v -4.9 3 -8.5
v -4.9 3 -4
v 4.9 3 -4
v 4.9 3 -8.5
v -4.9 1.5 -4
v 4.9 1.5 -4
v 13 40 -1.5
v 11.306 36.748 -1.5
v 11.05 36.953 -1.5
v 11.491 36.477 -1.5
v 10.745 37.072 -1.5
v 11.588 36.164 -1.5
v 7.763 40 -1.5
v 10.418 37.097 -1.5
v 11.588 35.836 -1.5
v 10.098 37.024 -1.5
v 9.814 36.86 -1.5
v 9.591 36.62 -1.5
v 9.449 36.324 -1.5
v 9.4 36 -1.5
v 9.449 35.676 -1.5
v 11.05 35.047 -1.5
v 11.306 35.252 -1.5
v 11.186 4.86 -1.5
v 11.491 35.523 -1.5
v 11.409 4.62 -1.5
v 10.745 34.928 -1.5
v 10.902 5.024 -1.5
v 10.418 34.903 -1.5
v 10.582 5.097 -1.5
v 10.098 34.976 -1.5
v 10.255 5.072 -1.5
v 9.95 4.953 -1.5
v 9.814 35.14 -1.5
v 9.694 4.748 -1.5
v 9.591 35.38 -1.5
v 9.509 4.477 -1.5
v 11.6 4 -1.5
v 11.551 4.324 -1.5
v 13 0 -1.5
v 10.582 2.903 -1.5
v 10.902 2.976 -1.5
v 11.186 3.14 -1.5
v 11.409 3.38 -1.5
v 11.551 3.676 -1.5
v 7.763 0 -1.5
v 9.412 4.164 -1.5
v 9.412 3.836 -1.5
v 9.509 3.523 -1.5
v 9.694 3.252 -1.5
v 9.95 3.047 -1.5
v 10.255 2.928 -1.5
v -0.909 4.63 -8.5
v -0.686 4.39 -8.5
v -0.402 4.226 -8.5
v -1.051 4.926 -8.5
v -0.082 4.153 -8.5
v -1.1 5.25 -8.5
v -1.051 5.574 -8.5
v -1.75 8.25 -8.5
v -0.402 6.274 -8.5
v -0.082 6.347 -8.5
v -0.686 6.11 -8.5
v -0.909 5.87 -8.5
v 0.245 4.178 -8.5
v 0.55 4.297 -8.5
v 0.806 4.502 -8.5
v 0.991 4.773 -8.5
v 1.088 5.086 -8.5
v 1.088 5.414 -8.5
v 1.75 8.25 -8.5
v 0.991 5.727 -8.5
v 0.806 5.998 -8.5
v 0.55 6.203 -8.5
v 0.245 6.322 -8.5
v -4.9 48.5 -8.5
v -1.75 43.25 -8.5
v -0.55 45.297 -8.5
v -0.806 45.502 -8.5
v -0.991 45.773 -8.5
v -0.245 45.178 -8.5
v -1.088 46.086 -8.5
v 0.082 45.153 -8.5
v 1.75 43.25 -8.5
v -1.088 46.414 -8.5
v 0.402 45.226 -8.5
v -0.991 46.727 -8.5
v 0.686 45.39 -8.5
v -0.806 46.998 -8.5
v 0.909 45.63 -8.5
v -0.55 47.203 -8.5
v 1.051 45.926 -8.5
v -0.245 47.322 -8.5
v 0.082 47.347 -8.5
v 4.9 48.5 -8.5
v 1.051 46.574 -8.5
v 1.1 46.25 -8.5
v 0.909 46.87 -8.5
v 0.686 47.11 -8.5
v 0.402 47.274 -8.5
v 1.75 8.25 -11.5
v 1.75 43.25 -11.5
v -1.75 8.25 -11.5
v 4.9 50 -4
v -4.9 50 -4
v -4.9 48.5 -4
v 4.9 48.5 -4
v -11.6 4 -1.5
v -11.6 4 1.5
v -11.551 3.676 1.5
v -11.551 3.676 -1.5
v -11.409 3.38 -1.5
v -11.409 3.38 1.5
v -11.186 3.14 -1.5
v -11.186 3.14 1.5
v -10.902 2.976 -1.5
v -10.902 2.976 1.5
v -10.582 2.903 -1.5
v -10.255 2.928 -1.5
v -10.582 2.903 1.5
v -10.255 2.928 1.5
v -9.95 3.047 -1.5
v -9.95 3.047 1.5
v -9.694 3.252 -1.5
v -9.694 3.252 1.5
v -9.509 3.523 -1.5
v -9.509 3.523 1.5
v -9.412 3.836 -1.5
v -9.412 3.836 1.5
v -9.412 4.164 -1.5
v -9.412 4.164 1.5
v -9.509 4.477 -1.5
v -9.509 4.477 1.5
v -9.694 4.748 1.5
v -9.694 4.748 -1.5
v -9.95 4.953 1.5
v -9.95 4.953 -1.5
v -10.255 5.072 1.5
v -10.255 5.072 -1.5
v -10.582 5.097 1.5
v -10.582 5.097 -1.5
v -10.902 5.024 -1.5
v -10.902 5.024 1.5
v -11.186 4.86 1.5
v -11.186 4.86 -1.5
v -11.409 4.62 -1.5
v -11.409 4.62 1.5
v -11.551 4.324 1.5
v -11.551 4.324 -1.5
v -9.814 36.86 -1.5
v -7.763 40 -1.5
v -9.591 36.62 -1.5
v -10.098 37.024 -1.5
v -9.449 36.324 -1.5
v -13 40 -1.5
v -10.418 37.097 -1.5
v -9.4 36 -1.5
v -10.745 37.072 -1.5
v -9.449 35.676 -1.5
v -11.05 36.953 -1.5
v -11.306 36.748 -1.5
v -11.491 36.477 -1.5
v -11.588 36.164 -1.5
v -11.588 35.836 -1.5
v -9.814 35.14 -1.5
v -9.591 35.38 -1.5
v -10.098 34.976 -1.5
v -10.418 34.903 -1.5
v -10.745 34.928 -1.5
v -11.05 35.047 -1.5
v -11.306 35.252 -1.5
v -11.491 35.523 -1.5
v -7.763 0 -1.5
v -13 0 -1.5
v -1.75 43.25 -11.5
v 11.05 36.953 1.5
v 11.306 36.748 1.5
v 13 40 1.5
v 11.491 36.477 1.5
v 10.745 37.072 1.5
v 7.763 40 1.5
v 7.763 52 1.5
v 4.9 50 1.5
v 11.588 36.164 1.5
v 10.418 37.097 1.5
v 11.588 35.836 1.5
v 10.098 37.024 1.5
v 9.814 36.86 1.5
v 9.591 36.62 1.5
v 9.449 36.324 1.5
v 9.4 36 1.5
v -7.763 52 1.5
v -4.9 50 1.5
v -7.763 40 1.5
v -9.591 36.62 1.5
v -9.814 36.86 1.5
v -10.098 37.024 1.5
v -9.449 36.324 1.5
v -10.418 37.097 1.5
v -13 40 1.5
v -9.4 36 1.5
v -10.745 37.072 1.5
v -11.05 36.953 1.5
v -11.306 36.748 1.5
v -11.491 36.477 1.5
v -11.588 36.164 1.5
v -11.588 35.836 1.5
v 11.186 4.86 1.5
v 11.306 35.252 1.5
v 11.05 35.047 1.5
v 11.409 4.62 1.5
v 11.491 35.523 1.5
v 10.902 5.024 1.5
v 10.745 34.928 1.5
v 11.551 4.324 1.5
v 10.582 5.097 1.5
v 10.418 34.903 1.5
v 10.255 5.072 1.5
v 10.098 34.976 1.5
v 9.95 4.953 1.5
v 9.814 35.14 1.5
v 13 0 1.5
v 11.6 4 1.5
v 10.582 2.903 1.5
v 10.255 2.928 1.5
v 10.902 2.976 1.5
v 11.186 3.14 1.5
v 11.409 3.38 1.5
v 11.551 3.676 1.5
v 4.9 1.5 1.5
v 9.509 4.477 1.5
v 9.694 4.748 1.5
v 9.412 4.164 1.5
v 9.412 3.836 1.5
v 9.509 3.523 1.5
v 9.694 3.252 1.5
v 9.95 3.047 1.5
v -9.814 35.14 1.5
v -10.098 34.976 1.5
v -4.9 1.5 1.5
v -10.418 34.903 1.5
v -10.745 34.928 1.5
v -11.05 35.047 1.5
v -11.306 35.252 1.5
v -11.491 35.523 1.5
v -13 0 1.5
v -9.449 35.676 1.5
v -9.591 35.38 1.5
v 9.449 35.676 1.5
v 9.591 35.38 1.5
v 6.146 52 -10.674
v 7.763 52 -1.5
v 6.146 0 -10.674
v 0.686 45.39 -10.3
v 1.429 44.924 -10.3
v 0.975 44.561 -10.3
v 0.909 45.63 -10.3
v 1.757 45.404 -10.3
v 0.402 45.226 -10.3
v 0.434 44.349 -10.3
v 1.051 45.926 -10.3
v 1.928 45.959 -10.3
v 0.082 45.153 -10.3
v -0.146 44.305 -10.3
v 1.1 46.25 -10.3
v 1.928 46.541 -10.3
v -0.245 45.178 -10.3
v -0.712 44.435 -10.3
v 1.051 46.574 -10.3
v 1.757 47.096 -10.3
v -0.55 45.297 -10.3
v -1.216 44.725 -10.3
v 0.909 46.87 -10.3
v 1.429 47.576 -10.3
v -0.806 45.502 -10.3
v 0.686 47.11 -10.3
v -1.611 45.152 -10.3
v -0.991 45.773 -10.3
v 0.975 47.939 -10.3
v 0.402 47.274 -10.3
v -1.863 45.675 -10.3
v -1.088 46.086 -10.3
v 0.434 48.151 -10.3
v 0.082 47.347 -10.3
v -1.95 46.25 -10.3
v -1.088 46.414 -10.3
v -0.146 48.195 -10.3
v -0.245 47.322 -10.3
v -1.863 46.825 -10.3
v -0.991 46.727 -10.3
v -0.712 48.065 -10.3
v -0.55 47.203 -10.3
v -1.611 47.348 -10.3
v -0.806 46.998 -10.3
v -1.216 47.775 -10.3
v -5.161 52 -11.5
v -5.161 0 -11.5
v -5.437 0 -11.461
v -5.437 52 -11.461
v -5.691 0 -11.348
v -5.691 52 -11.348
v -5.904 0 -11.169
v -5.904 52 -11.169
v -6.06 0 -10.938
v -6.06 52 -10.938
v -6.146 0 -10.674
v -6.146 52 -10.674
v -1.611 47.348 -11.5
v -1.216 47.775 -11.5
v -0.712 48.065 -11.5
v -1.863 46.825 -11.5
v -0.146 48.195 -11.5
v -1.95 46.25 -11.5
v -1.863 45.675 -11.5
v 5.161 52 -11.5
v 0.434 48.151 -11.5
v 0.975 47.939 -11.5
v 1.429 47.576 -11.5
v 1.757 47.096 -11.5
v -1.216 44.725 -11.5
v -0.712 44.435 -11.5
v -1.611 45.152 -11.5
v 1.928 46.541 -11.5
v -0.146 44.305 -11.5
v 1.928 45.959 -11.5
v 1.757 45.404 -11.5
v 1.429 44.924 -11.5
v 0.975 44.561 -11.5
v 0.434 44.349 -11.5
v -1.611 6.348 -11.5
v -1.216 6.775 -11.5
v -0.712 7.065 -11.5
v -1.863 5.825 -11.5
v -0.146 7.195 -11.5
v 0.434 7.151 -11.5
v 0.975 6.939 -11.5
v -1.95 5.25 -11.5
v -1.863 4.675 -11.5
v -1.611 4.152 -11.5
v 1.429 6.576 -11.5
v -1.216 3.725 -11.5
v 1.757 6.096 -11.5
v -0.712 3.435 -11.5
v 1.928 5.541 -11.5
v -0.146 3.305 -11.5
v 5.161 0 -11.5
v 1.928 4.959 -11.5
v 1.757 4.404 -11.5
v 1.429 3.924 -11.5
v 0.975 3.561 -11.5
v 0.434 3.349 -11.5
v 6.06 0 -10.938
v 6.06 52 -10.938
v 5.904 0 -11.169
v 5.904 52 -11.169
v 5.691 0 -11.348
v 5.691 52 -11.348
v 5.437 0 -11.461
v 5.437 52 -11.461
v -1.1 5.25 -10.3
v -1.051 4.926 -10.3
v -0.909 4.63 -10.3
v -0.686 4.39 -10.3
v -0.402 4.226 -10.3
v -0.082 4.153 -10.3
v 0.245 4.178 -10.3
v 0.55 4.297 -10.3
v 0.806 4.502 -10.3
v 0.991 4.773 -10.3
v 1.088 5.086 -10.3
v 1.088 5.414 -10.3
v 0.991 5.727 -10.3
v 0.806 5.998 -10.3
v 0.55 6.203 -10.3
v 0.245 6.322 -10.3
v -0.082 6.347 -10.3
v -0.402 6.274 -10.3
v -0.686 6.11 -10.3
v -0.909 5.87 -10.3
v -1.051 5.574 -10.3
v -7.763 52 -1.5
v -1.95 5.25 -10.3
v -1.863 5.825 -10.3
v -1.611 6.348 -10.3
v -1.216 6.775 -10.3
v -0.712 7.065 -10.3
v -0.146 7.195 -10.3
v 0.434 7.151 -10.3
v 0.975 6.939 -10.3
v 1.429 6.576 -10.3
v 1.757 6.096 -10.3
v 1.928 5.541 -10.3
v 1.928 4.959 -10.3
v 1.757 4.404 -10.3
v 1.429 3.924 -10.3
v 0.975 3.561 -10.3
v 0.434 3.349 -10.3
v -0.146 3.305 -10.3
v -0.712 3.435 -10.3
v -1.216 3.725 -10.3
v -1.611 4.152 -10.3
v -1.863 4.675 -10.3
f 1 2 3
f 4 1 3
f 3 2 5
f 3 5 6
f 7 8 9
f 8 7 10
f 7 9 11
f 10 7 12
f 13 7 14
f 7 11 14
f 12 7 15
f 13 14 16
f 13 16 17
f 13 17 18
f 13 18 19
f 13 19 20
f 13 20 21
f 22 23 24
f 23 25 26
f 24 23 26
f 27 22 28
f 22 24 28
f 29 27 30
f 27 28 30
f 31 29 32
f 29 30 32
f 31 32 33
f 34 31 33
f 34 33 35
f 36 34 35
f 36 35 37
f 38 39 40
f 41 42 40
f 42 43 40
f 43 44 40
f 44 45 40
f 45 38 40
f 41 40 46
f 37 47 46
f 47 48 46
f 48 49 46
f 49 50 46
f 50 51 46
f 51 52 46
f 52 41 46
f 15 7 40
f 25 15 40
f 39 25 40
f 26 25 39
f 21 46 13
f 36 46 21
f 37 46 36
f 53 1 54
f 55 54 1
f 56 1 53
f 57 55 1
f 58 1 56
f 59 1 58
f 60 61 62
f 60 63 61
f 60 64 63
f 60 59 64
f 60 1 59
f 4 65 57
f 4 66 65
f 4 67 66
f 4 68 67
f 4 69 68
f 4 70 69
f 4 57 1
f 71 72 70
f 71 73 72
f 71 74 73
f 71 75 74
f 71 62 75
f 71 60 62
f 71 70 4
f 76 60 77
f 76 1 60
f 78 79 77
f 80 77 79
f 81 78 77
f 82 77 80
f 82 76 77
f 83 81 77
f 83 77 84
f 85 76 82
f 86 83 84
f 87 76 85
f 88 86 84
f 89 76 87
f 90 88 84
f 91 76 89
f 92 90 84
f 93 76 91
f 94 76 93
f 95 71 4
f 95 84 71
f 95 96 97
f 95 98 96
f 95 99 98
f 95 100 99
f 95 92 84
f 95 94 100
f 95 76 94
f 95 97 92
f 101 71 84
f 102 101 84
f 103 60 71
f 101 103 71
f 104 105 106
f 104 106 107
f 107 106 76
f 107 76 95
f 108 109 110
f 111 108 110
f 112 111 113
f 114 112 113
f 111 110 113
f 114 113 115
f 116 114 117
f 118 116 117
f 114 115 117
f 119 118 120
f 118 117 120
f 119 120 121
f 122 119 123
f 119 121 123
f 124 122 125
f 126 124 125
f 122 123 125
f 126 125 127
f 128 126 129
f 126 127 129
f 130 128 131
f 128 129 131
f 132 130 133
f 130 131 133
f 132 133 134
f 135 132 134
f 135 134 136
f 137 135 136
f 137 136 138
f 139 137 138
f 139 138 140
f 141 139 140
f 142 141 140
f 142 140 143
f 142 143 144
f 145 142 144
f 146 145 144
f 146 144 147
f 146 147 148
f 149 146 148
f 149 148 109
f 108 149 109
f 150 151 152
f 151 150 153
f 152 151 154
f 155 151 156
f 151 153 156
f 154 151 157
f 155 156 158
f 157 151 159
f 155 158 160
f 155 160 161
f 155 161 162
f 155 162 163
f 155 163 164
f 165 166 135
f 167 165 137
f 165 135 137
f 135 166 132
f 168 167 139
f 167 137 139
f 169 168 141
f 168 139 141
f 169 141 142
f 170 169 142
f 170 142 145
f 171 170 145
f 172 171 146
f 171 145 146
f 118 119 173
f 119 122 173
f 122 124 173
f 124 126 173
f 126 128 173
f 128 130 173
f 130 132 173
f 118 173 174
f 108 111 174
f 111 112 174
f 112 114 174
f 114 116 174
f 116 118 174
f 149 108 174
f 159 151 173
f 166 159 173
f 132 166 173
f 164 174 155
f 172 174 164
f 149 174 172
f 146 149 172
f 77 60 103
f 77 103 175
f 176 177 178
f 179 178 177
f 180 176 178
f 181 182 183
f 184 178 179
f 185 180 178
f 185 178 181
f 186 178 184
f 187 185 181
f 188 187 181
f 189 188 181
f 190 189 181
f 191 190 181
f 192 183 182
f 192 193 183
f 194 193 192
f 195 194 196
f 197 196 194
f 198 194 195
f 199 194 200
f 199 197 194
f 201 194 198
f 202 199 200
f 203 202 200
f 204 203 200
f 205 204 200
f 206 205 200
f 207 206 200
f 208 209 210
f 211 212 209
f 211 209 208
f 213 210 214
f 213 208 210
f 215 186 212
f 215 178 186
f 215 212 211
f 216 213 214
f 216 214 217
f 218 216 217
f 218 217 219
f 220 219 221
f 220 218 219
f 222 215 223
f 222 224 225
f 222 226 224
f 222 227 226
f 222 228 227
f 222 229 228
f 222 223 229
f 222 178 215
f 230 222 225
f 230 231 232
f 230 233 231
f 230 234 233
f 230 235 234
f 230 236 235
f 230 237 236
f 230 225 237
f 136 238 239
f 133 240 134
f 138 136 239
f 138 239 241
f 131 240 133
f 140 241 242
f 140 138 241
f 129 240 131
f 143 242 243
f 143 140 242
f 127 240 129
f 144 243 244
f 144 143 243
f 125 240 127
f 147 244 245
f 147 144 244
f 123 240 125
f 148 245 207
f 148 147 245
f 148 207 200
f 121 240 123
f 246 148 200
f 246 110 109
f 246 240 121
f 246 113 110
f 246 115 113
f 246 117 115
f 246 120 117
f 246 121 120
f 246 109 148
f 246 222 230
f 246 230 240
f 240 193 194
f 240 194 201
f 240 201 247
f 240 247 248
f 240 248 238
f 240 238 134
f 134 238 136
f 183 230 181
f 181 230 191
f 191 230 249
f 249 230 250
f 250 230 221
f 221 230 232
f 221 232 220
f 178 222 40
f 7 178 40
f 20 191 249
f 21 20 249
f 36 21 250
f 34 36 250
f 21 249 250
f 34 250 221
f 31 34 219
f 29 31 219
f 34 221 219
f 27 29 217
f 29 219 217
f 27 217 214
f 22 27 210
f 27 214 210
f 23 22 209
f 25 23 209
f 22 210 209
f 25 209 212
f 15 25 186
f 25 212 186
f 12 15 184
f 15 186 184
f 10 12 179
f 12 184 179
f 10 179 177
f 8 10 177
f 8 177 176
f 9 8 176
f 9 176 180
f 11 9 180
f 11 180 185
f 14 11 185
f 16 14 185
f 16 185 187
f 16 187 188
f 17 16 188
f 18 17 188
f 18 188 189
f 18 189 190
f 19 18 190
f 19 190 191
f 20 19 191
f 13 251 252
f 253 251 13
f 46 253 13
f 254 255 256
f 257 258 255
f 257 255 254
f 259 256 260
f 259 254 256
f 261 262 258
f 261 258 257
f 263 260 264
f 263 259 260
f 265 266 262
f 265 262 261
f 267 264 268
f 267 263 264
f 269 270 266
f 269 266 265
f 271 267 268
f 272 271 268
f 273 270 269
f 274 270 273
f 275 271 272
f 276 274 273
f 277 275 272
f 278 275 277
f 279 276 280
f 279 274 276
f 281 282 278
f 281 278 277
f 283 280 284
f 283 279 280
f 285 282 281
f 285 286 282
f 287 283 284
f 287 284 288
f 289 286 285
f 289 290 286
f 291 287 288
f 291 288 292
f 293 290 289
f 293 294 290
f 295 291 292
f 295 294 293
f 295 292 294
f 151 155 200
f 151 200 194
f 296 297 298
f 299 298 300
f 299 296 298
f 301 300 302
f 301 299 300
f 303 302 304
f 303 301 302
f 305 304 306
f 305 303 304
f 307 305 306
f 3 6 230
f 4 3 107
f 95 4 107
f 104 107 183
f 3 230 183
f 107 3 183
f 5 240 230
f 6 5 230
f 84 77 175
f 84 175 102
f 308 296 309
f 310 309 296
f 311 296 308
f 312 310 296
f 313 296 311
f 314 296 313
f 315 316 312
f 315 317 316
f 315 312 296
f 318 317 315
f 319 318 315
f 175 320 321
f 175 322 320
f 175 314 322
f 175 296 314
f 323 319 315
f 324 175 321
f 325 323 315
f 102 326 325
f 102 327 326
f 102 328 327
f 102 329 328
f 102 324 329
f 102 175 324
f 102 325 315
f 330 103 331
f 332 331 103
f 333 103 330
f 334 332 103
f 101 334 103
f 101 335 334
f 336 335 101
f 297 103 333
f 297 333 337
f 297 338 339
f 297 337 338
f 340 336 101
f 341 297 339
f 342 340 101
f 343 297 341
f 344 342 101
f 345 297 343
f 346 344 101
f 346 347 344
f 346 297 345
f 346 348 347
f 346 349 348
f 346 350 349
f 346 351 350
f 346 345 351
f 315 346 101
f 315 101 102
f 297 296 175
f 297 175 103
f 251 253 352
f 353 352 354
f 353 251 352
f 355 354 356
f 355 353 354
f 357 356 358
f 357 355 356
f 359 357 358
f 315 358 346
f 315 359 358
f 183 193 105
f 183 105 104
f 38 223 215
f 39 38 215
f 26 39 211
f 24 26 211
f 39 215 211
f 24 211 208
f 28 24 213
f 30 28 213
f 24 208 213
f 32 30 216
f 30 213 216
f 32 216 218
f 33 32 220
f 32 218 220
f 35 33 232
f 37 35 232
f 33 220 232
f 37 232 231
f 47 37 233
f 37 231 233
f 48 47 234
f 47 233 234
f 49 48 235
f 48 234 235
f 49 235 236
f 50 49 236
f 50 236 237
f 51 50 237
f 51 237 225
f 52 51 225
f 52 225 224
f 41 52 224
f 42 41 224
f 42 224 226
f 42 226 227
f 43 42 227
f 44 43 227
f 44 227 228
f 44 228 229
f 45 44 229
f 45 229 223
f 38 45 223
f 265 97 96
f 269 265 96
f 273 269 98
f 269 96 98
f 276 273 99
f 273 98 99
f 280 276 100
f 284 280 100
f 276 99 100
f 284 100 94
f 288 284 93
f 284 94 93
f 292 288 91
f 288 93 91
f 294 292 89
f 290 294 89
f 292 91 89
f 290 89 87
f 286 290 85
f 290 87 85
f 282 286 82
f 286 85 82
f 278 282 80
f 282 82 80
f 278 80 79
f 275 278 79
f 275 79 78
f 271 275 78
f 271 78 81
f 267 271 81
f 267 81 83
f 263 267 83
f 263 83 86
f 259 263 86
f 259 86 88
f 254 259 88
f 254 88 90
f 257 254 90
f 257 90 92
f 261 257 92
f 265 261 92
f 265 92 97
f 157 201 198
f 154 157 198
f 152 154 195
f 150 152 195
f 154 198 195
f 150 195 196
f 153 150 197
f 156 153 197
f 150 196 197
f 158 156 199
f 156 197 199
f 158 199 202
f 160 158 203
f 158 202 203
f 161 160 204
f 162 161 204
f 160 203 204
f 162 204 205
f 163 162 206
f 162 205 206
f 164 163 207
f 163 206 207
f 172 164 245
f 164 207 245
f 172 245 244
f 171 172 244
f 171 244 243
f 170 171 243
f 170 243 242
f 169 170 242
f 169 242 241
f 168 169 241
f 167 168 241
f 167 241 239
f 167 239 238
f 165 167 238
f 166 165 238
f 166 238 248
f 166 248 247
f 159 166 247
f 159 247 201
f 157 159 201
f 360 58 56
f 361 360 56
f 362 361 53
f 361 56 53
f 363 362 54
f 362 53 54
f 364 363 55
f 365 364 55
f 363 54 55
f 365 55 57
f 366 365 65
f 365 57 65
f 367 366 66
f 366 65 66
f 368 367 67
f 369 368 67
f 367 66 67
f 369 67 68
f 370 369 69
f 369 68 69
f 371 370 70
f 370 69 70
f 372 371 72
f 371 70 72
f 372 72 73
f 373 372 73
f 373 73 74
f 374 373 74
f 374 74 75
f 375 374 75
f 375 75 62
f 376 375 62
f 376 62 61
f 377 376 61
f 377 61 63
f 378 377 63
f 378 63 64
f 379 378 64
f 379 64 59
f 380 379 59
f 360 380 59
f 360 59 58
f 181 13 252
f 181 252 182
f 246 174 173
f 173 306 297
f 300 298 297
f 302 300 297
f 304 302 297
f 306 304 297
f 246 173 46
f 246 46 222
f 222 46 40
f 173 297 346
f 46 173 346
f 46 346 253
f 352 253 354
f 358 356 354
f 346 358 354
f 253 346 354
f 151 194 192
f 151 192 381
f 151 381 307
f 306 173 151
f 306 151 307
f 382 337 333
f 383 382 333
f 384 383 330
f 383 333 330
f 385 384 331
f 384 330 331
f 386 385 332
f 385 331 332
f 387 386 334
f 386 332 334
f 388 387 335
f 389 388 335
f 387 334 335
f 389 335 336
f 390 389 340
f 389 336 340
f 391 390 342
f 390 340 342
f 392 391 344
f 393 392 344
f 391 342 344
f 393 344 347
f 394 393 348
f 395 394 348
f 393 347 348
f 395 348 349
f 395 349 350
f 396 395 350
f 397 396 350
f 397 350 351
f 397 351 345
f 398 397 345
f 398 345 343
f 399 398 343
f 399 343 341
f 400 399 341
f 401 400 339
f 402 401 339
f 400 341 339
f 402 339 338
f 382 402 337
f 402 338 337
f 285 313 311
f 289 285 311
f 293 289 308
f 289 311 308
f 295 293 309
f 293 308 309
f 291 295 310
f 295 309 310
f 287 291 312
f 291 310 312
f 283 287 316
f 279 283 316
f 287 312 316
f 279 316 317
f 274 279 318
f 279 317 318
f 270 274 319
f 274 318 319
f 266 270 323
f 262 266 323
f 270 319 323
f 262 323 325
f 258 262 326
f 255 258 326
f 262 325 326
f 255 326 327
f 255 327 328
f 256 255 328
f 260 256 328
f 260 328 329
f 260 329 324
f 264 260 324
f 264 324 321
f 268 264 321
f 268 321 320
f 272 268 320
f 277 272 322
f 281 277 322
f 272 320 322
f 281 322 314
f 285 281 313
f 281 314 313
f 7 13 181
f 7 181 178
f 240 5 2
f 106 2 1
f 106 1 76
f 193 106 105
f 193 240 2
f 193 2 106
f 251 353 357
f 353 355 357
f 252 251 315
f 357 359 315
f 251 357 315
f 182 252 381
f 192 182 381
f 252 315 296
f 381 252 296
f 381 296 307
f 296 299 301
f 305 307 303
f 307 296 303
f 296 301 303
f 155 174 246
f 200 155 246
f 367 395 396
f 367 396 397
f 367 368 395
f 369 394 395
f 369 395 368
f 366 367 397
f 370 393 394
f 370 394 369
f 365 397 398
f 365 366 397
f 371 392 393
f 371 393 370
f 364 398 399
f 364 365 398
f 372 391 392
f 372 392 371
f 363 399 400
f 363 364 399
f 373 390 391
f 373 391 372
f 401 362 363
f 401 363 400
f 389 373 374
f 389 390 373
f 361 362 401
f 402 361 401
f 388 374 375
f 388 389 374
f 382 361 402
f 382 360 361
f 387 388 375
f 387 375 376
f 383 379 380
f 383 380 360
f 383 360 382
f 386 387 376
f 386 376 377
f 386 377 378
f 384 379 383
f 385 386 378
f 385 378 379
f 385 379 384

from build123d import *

# Parameters (mm, degrees)
EXTRUDE_1_DEPTH     = 40
EXTRUDE_2_DEPTH     = 12
SKETCH_3_W          = 9.8
SKETCH_3_H          = 45.5
CUT_EXTRUDE_1_DEPTH = 10
SKETCH_4_W          = 9.8
SKETCH_4_H          = 48.5
CUT_EXTRUDE_2_DEPTH = 5.5
SKETCH_5_R          = 1.1
CUT_EXTRUDE_3_DEPTH = 56.154328933
SKETCH_6_W          = 3.5
SKETCH_6_H          = 35
CUT_EXTRUDE_4_DEPTH = 55.525223521
SKETCH_7_R          = 1.1
CUT_EXTRUDE_5_DEPTH = 55.525223521
SKETCH_8_R          = 1.95
CUT_EXTRUDE_6_DEPTH = 1.2
FILLET_2_R          = 1


with BuildPart() as part:
    # 草图1 → 凸台-拉伸1 (new body)
    with BuildSketch(Plane(origin=(0, 0, 0), x_dir=(1, 0, 0), z_dir=(0, 1, 0))):
        Polygon((-6, 11.5), (-7.763269807, 1.5), (7.763269807, 1.5), (6, 11.5), align=None)
        Polygon((-7.763269807, 1.5), (-8.292250749, -1.5), (8.292250749, -1.5), (7.763269807, 1.5), align=None)
        Polygon((-13, 1.5), (-13, -1.5), (-8.292250749, -1.5), (-7.763269807, 1.5), align=None)
        Polygon((7.763269807, 1.5), (8.292250749, -1.5), (13, -1.5), (13, 1.5), align=None)
    extrude(amount=EXTRUDE_1_DEPTH)

    # 草图2 → 凸台-拉伸2 (add)
    with BuildSketch(Plane(origin=(0, 40, 0), x_dir=(1, 0, 0), z_dir=(0, 1, 0))):
        Polygon((6, 11.5), (7.763269807, 1.5), (7.763269807, -1.5), (-7.763269807, -1.5), (-7.763269807, 1.5), (-6, 11.5), align=None)
    extrude(amount=EXTRUDE_2_DEPTH)

    # 草图3 → 切除-拉伸1 (cut)
    with BuildSketch(Plane.XY.offset(1.5)):
        with Locations((0, 25.75)):
            Rectangle(SKETCH_3_W, SKETCH_3_H)
    extrude(amount=-CUT_EXTRUDE_1_DEPTH, mode=Mode.SUBTRACT)

    # 草图4 → 切除-拉伸2 (cut)
    with BuildSketch(Plane.XY.offset(1.5)):
        with Locations((0, 25.75)):
            Rectangle(SKETCH_4_W, SKETCH_4_H)
    extrude(amount=-CUT_EXTRUDE_2_DEPTH, mode=Mode.SUBTRACT)

    # 草图5 → 切除-拉伸3 (cut, through all)
    with BuildSketch(Plane.XY.offset(1.5)):
        with Locations((-10.5, 36)):
            Circle(SKETCH_5_R)
        with Locations(Location((-10.5, 4, 0), (0, 0, 180))):
            Circle(SKETCH_5_R)
        with Locations((10.5, 4)):
            Circle(SKETCH_5_R)
        with Locations(Location((10.5, 36, 0), (0, 0, 180))):
            Circle(SKETCH_5_R)
    extrude(amount=-CUT_EXTRUDE_3_DEPTH, mode=Mode.SUBTRACT)

    # 草图6 → 切除-拉伸4 (cut, through all)
    with BuildSketch(Plane.XY.offset(-8.5)):
        with Locations((0, 25.75)):
            Rectangle(SKETCH_6_W, SKETCH_6_H)
    extrude(amount=-CUT_EXTRUDE_4_DEPTH, mode=Mode.SUBTRACT)

    # 草图7 → 切除-拉伸5 (cut, through all)
    with BuildSketch(Plane.XY.offset(-8.5)):
        with Locations((0, 46.25)):
            Circle(SKETCH_7_R)
        with Locations(Location((0, 5.25, 0), (0, 0, 180))):
            Circle(SKETCH_7_R)
    extrude(amount=-CUT_EXTRUDE_5_DEPTH, mode=Mode.SUBTRACT)

    # 草图8 → 切除-拉伸6 (cut)
    with BuildSketch(Plane(origin=(0, 0, -11.5), x_dir=(-1, 0, 0), z_dir=(0, 0, -1))):
        with Locations((0, 46.25)):
            Circle(SKETCH_8_R)
        with Locations((0, 5.25)):
            Circle(SKETCH_8_R)
    extrude(amount=-CUT_EXTRUDE_6_DEPTH, mode=Mode.SUBTRACT)

    # 圆角2
    fillet_2_edges = [part.edges().sort_by_distance(p)[0] for p in [
        (6, 26, -11.5),
        (-6, 26, -11.5),
    ]]
    fillet(fillet_2_edges, radius=FILLET_2_R)


solid = part.part
